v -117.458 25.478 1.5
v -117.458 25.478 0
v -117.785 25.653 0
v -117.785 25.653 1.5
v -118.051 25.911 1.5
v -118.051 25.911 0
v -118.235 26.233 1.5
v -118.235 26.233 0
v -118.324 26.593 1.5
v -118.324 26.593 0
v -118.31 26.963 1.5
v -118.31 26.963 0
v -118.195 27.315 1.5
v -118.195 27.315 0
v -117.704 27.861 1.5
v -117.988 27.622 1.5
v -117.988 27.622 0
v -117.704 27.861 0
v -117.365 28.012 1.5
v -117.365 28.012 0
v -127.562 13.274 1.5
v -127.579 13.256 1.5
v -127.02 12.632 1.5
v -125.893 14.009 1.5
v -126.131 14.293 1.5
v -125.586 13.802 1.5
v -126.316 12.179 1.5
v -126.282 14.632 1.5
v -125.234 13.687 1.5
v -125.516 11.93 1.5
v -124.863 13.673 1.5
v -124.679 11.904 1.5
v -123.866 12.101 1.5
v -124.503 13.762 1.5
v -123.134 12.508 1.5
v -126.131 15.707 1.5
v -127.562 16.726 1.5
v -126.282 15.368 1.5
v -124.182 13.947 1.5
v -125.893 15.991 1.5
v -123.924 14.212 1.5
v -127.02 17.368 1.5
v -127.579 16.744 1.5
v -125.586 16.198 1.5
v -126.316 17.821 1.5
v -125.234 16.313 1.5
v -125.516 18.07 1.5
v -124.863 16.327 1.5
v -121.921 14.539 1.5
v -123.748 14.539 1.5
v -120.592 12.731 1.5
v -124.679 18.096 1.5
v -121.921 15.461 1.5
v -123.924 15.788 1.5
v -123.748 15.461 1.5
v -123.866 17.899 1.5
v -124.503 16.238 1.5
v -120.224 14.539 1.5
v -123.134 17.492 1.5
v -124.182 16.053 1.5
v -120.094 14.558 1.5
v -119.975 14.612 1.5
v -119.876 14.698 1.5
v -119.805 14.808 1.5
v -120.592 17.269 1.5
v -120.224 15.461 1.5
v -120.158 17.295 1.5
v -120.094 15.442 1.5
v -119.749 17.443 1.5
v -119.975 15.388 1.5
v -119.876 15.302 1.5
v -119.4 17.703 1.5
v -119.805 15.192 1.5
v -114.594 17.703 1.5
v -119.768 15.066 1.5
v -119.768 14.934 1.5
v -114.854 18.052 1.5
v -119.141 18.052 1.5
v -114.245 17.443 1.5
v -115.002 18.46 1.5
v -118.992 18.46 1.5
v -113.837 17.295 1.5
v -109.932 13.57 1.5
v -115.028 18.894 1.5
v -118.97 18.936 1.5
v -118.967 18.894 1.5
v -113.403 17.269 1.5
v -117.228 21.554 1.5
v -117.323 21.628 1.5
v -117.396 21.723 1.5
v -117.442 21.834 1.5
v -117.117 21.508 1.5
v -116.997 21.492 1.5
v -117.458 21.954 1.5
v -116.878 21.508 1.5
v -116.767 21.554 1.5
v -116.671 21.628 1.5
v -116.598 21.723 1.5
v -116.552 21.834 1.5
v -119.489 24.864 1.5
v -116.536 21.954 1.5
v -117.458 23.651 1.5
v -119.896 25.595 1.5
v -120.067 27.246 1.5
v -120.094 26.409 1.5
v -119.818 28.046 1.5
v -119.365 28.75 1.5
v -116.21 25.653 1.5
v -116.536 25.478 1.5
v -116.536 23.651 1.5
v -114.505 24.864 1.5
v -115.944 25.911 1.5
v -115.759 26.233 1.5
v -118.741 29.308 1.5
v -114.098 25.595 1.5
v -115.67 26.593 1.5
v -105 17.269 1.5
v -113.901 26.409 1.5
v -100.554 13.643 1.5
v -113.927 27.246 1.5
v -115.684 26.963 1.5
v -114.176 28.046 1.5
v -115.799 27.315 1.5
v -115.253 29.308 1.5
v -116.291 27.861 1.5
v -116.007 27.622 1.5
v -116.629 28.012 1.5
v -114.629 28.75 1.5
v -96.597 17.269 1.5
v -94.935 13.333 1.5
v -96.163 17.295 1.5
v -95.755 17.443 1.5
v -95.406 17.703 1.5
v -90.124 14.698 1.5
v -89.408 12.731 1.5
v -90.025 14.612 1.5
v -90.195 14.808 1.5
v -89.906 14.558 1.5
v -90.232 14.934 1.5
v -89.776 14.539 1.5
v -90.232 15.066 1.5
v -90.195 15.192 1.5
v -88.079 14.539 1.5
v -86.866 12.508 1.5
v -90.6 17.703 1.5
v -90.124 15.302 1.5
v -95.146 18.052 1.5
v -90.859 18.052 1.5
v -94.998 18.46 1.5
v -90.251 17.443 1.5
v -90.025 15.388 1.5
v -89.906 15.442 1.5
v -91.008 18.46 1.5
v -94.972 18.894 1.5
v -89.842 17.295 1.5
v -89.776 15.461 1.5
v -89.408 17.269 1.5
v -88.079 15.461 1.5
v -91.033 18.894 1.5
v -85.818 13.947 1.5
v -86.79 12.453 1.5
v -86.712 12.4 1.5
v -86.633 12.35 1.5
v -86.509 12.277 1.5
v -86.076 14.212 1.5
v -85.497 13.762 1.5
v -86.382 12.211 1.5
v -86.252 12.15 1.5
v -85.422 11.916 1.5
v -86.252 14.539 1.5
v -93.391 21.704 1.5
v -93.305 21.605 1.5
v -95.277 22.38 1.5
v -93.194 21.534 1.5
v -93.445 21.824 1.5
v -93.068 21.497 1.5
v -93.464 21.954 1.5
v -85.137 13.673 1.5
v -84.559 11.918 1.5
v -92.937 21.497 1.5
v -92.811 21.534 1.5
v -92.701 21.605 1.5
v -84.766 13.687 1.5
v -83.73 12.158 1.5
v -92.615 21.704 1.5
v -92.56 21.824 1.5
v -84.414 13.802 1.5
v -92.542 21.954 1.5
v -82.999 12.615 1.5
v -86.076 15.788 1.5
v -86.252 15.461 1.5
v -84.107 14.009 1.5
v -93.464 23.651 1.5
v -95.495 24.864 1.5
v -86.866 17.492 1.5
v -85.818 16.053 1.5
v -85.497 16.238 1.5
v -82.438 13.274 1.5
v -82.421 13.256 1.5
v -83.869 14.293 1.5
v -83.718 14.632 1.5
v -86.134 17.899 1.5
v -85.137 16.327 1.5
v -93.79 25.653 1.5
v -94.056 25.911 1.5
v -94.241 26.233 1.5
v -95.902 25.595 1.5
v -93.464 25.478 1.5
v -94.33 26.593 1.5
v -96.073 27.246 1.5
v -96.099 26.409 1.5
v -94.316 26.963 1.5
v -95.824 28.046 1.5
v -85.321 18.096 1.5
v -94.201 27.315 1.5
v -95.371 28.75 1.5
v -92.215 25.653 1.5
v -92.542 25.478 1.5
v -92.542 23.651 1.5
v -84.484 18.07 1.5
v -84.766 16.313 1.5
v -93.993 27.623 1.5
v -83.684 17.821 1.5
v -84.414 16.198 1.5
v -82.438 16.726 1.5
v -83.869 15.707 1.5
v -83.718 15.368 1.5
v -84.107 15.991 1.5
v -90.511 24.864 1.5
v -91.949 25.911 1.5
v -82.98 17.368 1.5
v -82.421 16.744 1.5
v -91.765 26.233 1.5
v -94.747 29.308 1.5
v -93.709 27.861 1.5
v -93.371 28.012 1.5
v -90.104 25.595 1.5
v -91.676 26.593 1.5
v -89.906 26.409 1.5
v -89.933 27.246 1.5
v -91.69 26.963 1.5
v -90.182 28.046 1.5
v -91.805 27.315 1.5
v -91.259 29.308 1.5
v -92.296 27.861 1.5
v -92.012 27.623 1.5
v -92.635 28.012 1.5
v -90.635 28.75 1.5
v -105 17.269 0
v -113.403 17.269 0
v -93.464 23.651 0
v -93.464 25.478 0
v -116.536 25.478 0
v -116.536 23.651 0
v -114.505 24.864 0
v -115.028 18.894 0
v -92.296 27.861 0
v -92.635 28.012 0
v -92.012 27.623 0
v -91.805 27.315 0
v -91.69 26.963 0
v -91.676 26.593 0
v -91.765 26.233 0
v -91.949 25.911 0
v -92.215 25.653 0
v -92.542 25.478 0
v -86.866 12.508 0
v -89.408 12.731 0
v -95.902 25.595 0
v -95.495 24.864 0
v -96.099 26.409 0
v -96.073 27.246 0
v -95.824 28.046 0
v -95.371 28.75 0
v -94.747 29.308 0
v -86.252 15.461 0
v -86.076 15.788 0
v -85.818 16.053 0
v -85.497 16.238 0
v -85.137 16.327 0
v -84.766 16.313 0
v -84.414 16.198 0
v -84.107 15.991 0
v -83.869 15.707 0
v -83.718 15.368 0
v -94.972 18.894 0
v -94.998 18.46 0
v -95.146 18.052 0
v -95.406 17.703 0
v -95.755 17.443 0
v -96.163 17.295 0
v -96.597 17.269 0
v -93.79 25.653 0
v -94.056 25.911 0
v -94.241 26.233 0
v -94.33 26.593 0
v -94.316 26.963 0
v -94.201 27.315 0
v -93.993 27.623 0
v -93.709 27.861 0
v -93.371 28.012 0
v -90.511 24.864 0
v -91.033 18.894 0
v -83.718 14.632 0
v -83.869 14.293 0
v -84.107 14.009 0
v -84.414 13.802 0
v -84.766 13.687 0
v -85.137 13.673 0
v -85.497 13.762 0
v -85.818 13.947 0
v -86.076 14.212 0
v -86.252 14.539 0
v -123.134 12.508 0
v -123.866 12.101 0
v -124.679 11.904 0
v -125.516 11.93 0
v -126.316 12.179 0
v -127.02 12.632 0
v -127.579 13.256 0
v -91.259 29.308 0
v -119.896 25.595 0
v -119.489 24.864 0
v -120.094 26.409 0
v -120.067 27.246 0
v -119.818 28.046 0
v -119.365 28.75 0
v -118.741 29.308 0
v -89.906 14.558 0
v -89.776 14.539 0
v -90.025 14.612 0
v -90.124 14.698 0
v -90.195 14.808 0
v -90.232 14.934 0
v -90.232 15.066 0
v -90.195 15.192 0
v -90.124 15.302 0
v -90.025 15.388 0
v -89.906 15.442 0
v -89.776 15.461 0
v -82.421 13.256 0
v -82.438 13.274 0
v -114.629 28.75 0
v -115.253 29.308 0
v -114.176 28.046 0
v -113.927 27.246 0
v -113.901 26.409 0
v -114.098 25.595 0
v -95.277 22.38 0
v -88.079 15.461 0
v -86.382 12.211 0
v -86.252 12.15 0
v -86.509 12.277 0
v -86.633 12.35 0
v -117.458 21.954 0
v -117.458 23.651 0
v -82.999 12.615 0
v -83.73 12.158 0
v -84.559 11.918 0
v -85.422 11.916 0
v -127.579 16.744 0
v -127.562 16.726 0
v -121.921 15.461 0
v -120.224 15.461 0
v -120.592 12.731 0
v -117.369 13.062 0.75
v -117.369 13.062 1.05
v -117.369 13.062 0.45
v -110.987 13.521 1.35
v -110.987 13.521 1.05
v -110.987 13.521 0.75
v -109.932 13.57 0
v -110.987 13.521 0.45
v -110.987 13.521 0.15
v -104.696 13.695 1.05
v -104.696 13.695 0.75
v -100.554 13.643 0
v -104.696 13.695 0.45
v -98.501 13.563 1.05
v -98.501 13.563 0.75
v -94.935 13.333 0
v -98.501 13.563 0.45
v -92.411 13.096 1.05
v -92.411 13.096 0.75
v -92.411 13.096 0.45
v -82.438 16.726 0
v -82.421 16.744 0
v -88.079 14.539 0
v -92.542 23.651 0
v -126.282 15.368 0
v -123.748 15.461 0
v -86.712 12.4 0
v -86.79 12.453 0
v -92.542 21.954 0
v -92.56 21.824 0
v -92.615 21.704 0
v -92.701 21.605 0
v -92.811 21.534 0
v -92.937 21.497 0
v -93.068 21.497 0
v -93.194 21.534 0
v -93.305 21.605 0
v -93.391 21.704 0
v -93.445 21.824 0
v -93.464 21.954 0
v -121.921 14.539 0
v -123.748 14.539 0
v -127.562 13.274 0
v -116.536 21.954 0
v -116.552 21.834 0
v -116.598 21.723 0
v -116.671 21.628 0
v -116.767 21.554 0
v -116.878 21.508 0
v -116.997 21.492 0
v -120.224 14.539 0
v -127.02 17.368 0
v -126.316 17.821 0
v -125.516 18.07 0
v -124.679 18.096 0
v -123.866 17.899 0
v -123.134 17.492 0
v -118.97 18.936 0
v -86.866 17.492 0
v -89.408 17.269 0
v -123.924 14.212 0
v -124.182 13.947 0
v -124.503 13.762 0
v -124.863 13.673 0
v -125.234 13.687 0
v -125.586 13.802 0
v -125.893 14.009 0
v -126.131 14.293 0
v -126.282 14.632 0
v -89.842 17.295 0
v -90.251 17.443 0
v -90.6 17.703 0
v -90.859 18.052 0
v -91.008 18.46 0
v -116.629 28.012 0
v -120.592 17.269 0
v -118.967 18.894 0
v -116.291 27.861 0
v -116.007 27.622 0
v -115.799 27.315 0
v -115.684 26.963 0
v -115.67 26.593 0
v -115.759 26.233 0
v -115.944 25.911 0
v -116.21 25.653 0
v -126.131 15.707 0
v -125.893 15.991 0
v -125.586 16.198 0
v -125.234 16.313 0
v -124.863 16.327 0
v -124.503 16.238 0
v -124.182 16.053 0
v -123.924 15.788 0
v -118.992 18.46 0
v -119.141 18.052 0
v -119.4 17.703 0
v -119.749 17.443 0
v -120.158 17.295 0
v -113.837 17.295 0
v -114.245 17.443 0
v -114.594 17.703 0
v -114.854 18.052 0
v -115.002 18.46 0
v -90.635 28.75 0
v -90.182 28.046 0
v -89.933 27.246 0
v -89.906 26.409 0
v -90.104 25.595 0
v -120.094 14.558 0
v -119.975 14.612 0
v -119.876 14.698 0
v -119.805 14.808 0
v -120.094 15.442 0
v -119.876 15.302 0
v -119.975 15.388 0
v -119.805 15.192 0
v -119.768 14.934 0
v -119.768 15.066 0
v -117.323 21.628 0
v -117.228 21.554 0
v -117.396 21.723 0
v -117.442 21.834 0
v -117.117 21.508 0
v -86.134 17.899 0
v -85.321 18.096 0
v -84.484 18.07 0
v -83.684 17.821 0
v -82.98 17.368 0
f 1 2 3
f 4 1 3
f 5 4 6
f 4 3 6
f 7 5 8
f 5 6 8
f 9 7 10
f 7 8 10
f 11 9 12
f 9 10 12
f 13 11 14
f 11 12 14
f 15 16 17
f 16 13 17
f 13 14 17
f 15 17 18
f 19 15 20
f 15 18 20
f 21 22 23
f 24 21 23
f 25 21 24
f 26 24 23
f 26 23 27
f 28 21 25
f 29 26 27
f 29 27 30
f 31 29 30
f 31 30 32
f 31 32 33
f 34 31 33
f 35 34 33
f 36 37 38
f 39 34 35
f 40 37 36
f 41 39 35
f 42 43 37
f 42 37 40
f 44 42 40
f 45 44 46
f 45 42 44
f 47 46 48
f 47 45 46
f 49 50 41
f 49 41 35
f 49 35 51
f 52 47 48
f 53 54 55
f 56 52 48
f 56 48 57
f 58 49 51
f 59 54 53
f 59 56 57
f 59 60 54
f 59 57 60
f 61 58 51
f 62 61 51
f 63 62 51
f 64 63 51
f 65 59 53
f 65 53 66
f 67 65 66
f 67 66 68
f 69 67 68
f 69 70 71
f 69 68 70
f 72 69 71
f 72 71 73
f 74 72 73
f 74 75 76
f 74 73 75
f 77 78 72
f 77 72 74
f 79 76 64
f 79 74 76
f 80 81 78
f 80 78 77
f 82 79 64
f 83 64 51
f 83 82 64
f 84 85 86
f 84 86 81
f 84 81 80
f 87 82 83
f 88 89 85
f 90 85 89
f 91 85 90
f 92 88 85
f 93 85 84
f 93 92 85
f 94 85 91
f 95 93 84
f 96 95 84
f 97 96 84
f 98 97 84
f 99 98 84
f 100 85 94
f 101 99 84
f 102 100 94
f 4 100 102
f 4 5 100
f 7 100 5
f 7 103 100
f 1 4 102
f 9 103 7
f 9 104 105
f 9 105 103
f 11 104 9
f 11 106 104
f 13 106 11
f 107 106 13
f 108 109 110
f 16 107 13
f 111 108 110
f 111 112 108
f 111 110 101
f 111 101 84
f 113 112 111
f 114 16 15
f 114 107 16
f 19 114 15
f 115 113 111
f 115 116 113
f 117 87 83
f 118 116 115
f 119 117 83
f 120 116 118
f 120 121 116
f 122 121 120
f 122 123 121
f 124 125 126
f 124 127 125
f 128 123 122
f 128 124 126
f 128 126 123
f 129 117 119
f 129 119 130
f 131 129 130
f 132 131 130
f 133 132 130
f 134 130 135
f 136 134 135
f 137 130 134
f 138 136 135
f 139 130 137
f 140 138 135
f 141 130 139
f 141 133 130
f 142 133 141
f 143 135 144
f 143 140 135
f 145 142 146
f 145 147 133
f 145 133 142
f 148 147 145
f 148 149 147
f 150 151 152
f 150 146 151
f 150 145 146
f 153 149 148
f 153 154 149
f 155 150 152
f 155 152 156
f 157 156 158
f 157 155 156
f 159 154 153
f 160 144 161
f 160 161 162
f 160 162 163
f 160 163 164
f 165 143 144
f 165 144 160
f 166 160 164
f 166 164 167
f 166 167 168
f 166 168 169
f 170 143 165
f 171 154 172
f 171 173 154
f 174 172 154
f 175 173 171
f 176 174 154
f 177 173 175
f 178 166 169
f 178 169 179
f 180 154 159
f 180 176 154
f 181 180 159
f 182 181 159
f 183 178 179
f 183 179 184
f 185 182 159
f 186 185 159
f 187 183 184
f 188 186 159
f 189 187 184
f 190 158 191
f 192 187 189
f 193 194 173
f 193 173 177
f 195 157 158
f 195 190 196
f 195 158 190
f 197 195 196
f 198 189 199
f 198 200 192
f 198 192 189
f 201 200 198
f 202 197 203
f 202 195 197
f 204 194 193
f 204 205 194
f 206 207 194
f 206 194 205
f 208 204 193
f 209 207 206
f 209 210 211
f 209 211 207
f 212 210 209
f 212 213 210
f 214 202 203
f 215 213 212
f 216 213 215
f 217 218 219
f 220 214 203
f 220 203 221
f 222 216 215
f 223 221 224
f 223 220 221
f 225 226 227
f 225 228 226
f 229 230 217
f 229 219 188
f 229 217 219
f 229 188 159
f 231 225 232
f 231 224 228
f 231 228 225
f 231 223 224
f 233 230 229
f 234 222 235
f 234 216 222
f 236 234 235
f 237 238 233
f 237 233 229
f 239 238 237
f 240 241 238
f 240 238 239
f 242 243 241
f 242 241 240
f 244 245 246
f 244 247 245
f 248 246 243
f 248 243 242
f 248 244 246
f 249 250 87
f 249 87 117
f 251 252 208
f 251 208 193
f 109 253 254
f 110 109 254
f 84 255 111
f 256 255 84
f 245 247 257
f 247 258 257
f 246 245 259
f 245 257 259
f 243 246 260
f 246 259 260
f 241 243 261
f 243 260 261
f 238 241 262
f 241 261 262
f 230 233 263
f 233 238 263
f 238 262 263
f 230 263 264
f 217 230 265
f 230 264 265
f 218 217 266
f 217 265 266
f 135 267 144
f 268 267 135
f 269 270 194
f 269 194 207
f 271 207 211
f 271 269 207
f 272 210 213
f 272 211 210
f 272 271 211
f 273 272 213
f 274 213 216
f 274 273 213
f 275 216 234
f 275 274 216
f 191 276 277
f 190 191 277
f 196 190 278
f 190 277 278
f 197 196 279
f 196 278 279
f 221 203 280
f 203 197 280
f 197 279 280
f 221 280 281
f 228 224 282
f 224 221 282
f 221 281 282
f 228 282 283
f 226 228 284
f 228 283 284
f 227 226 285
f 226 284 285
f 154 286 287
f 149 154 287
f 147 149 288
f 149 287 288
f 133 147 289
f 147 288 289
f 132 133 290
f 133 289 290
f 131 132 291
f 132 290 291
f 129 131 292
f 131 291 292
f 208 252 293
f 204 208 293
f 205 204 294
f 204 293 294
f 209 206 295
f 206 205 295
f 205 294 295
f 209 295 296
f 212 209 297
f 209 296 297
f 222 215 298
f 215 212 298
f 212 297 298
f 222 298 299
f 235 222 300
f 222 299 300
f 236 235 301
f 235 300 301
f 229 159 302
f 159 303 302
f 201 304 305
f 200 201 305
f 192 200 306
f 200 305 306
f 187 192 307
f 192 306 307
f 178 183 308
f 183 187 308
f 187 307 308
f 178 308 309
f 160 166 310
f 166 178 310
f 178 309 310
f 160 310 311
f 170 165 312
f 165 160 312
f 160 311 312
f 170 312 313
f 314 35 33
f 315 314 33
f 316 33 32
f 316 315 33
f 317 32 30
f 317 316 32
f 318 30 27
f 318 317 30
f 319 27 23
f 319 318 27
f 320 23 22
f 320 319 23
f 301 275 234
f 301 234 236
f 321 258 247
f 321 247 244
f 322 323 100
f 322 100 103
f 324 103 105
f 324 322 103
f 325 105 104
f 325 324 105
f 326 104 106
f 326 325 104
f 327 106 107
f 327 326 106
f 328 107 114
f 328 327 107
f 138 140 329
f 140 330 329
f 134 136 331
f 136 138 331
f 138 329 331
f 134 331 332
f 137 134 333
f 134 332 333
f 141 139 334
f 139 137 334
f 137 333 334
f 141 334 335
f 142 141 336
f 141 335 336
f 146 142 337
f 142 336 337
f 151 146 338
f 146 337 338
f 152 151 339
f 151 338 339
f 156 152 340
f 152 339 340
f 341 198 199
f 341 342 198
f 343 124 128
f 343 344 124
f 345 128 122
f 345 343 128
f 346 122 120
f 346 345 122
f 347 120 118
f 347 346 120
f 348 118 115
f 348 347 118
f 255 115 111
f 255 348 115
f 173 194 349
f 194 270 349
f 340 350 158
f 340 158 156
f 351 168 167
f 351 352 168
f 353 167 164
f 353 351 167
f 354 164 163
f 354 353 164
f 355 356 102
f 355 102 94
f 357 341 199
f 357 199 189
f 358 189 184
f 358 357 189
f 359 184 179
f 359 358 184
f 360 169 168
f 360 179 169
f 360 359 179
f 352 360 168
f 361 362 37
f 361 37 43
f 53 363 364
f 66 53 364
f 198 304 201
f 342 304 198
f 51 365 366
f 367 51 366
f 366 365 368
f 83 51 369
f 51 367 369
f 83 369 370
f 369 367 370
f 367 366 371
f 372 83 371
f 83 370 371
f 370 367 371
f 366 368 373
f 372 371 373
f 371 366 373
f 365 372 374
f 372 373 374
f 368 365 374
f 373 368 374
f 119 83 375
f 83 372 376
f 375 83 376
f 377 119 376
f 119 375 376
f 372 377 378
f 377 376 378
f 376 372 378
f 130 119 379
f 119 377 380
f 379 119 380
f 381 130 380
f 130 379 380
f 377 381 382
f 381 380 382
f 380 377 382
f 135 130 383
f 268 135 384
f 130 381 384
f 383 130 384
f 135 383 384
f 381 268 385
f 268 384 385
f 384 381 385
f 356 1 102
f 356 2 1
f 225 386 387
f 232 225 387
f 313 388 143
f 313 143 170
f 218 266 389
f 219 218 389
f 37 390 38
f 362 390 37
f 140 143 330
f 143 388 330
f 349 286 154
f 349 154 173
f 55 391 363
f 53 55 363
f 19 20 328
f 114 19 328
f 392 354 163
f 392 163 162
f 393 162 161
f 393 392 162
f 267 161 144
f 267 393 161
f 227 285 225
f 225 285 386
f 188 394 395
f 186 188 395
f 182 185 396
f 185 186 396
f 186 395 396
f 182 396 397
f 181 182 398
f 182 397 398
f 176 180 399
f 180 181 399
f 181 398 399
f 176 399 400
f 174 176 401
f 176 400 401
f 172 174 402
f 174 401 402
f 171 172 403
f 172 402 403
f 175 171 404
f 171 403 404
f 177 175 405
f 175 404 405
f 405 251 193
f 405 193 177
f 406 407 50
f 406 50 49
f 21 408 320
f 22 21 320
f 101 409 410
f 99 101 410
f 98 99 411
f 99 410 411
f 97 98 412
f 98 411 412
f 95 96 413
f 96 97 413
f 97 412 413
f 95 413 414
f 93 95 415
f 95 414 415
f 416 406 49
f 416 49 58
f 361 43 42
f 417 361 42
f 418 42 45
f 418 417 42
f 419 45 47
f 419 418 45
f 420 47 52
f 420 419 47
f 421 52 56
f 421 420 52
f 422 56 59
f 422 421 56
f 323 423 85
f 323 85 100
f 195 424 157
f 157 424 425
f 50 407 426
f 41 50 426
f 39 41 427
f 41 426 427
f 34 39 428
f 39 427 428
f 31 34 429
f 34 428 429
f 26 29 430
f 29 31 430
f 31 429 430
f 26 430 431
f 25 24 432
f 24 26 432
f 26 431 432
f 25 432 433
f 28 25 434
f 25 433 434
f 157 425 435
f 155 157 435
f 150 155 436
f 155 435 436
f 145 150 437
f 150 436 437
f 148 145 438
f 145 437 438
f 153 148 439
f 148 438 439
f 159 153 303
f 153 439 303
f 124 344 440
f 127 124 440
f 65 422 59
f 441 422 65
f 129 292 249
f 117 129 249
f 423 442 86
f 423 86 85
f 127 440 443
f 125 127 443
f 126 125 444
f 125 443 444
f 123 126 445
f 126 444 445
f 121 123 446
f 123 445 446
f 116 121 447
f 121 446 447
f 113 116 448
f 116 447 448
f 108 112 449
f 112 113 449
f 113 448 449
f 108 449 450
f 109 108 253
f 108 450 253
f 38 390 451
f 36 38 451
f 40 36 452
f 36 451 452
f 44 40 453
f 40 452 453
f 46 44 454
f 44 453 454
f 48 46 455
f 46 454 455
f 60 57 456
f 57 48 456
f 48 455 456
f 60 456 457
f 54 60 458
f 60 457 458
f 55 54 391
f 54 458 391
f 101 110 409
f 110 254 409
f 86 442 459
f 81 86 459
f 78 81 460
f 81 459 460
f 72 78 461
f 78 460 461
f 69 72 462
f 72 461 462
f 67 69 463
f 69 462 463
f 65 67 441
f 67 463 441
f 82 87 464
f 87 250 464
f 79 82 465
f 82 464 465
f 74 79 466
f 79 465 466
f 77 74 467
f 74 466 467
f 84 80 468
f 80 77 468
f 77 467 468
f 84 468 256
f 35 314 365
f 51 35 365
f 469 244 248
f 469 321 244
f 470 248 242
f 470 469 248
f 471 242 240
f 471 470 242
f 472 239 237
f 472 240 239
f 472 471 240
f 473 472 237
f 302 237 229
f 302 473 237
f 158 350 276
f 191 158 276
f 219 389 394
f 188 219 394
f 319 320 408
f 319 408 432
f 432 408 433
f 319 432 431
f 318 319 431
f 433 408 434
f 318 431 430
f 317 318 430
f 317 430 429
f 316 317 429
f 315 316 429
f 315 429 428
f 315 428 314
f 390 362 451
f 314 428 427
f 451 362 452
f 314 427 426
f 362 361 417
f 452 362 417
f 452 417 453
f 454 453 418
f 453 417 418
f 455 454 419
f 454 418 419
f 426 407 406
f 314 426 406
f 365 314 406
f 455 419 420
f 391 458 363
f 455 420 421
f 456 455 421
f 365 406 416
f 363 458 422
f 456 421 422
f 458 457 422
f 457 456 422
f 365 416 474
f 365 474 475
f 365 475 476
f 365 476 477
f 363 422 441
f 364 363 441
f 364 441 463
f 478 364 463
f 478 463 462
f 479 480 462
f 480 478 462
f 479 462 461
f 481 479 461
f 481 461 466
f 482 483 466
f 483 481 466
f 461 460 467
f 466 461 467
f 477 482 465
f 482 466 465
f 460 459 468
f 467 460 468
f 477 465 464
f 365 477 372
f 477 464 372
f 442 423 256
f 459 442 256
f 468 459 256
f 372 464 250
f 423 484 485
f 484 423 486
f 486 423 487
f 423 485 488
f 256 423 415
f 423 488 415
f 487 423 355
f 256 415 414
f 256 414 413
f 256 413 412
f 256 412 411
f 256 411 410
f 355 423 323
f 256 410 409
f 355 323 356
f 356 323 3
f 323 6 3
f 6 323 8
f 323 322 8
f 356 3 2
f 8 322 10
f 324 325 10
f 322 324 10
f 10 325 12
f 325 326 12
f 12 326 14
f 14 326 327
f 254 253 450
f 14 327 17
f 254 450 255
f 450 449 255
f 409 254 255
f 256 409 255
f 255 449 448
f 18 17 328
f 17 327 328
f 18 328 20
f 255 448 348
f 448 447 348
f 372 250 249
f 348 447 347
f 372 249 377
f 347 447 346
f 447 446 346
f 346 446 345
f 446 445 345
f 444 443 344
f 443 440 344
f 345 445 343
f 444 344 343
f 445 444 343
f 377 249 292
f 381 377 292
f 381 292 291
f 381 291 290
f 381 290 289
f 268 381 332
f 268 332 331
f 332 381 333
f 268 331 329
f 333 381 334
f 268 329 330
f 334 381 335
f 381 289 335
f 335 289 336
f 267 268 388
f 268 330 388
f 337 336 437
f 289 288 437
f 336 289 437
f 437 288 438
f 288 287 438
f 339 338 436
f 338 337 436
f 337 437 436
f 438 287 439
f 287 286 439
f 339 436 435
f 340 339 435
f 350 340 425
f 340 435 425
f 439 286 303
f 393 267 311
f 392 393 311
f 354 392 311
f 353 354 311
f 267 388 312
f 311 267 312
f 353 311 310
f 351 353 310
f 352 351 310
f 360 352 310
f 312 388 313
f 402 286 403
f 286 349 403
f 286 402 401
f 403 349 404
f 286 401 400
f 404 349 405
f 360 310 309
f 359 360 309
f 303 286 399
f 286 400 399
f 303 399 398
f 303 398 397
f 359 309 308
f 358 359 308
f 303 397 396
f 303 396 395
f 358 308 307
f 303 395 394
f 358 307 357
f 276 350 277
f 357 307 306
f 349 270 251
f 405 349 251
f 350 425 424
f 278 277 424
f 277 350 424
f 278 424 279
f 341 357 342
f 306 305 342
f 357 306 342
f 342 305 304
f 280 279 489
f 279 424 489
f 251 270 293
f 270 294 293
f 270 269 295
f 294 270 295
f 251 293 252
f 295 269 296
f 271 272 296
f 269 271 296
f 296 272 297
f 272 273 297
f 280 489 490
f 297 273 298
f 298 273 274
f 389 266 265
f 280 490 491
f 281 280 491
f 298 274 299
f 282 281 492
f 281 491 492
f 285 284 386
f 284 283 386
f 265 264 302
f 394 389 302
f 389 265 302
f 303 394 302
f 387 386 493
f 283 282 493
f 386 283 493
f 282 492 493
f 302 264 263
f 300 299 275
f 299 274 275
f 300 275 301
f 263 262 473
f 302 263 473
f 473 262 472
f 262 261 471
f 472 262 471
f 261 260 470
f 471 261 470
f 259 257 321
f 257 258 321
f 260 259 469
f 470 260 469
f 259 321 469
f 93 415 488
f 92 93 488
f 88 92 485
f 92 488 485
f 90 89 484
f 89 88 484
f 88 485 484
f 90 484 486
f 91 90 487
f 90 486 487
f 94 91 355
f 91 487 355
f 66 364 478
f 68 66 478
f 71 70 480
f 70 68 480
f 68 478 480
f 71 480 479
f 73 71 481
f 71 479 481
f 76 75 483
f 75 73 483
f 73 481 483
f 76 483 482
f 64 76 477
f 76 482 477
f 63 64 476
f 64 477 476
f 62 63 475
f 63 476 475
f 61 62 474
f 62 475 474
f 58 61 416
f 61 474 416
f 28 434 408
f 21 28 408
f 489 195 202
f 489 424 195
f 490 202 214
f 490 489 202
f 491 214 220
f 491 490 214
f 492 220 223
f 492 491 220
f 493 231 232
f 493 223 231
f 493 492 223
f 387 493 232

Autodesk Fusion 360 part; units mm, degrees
sketch "top view" plane through (0, 0, 0) normal (0, 0, 1) x (1, 0, 0)
  line L0 (-105, 33) -> (-105, -11) construction
  line L1 (-125, 15) -> (-126.282, 15) construction
  line L2 (-126.282, 15) -> (-126.282, 15.368) construction
  line L3 (-126.282, 15.368) -> (-127.5617, 16.726)
  line L4 (-126.282, 15.368) -> (-124.416, 15.368) construction
  line L5 (-127.5617, 16.726) -> (-127.5786, 16.744)
  line L6 (-126.282, 14.632) -> (-127.5617, 13.274)
  line L7 (-127.5617, 13.274) -> (-127.5786, 13.256)
  line L8 (-125, 15) -> (-123.748, 15) construction
  line L9 (-123.748, 15) -> (-123.748, 17.8501) construction
  line L10 (-123.748, 15) -> (-123.748, 12.1499) construction
  line L11 (-123.748, 15) -> (-123.748, 15.461) construction
  line L12 (-123.748, 15) -> (-123.748, 14.539) construction
  arc A0 (-126.282, 14.632) -> (-123.7484, 14.539) centre (-125, 15) ccw
  arc A1 (-123.7484, 15.461) -> (-126.282, 15.368) centre (-125, 15) ccw
  line L13 (-121.9213, 15.461) -> (-120.224, 15.461)
  line L14 (-121.9213, 14.539) -> (-120.224, 14.539)
  arc A2 (-127.5786, 13.256) -> (-123.134, 12.5083) centre (-125, 15) ccw
  arc A3 (-123.134, 17.4917) -> (-127.5786, 16.744) centre (-125, 15) ccw
  arc A4 (-120.224, 14.539) -> (-120.224, 15.461) centre (-120.224, 15) ccw
  line L15 (-125, 15) -> (-123.134, 15) construction
  line L16 (-123.134, 15) -> (-123.134, 17.4917) construction
  line L17 (-123.134, 17.4917) -> (-120.5917, 17.2693)
  line L18 (-123.134, 17.4917) -> (-120.582, 17.4917) construction
  line L19 (-123.134, 12.5083) -> (-120.5917, 12.7307)
  line L20 (-118.9667, 18.8943) -> (-119.4889, 24.8635)
  line L21 (-118.9667, 18.8943) -> (-111.0132, 18.8943) construction
  line L22 (-123.134, 17.4917) -> (-118.737, 17.4917) construction
  line L23 (-118.9667, 18.8942) -> (-118.9667, 18.8942)
  arc A5 (-120.5917, 17.2693) -> (-118.9667, 18.8943) centre (-120.461, 18.7636) ccw
  line L24 (-119.4004, 17.7029) -> (-121.3897, 15.7137) construction
  line L25 (-119.4004, 17.7029) -> (-116.4958, 14.7981) construction
  line L26 (-123.748, 15.461) -> (-121.9213, 15.461)
  line L27 (-123.748, 14.539) -> (-121.9213, 14.539)
  arc A6 (-117.4582, 21.9535) -> (-116.9972, 21.4925) centre (-116.9972, 21.9535) ccw
  line L28 (-116.9972, 20.106) -> (-116.9972, 11.6268) construction
  arc A7 (-115.0277, 18.8943) -> (-113.4026, 17.2693) centre (-113.5334, 18.7636) ccw
  line L29 (-113.4026, 17.2693) -> (-105, 17.2693)
  line L30 (-105, 33) -> (-105, -11) construction
  line L31 (-96.5974, 17.2693) -> (-105, 17.2693)
  arc A8 (-96.5974, 17.2693) -> (-94.9723, 18.8943) centre (-96.4667, 18.7636) ccw
  line L32 (-94.9723, 18.8943) -> (-95.2773, 22.3803)
  line L33 (-93.0028, 20.106) -> (-93.0028, 11.6268) construction
  line L34 (-91.7911, 18.8943) -> (-98.9868, 18.8943) construction
  line L35 (-91.0333, 17.2692) -> (-93.5042, 14.7981) construction
  line L36 (-91.0333, 17.4917) -> (-91.263, 17.4917) construction
  line L37 (-82.4383, 16.726) -> (-82.4214, 16.744)
  line L38 (-83.718, 15) -> (-83.718, 15.368) construction
  arc A9 (-86.866, 12.5083) -> (-86.252, 12.1499) centre (-85, 15) ccw
  line L39 (-91.0333, 18.8943) -> (-91.0333, 18.8943)
  line L40 (-82.4383, 13.274) -> (-82.4214, 13.256)
  spline S0 degree 5 poles (-120.5917, 12.7307) (-119.326, 12.8736) (-116.8026, 13.1337) (-113.042, 13.4467) (-108.0773, 13.7071) (-101.9596, 13.7532) (-97.0107, 13.5402) (-93.3168, 13.2188) (-90.8349, 12.9243) (-89.5363, 12.7482) (-89.4083, 12.7307) knots 0 0 0 0 0 0 0.1 0.2 0.3 0.4 0.5 0.51094 0.51094 0.51094 0.51094 0.51094 0.51094
  line L41 (-92.4447, 13.1474) -> (-86.3719, 12.3139)
  line L42 (-123.748, 14.539) -> (-123.7484, 14.539)
  line L43 (-123.748, 15.461) -> (-123.7484, 15.461)
  line L44 (-116.5362, 25.4775) -> (-116.5362, 25.4779)
  line L45 (-117.4582, 25.4775) -> (-117.4582, 25.4779)
  line L46 (-115.0277, 18.8943) -> (-115.0278, 18.8929)
  line L47 (-118.9704, 18.9365) -> (-118.9667, 18.8943)
  line L48 (-119.4004, 17.7029) -> (-116.9972, 20.106) construction
  line L49 (-125, 15) -> (-93.0028, 15) construction
  line L50 (-93.0028, 15) -> (-125, 15) construction
  line L51 (-91.7911, 18.8943) -> (-93.0028, 20.106) construction
  arc A10 (-114.5054, 24.8635) -> (-115.2532, 29.3081) centre (-116.9972, 26.7295) ccw
  arc A11 (-118.7411, 29.3081) -> (-119.4889, 24.8635) centre (-116.9972, 26.7295) ccw
  arc A12 (-117.3652, 28.0115) -> (-117.4582, 25.4779) centre (-116.9972, 26.7295) ccw
  arc A13 (-116.5362, 25.4779) -> (-116.6292, 28.0115) centre (-116.9972, 26.7295) ccw
  line L52 (-116.5362, 23.6508) -> (-116.5362, 21.9535)
  arc A14 (-117.4582, 21.9535) -> (-116.5362, 21.9535) centre (-116.9972, 21.9535) ccw
  line L53 (-117.4582, 23.6508) -> (-117.4582, 21.9535)
  line L54 (-116.5362, 25.4779) -> (-116.5362, 23.6508)
  line L55 (-117.4582, 25.4779) -> (-117.4582, 23.6508)
  line L56 (-115.2532, 29.3081) -> (-116.6292, 28.0115)
  line L57 (-117.3652, 28.0115) -> (-118.7411, 29.3081)
  line L58 (-114.5054, 24.8635) -> (-115.0278, 18.8929)
  arc A15 (-90.5111, 24.8635) -> (-91.2589, 29.3081) centre (-93.0028, 26.7295) ccw
  arc A16 (-94.7468, 29.3081) -> (-95.4946, 24.8635) centre (-93.0028, 26.7295) ccw
  line L59 (-94.7468, 29.3081) -> (-93.3708, 28.0115)
  line L60 (-92.6348, 28.0115) -> (-91.2589, 29.3081)
  arc A17 (-92.5418, 25.4779) -> (-92.6348, 28.0115) centre (-93.0028, 26.7295) ccw
  arc A18 (-93.3708, 28.0115) -> (-93.4638, 25.4779) centre (-93.0028, 26.7295) ccw
  line L61 (-93.4638, 25.4779) -> (-93.4638, 23.6508)
  line L62 (-92.5418, 25.4779) -> (-92.5418, 23.6508)
  line L63 (-91.0333, 18.8943) -> (-90.5111, 24.8635)
  line L64 (-92.5418, 23.6508) -> (-92.5418, 21.9535)
  line L65 (-93.4638, 23.6508) -> (-93.4638, 21.9535)
  arc A19 (-93.4638, 21.9535) -> (-92.5418, 21.9535) centre (-93.0028, 21.9535) ccw
  arc A20 (-91.0333, 18.8943) -> (-89.4083, 17.2693) centre (-89.539, 18.7636) ccw
  line L66 (-86.866, 17.4917) -> (-89.4083, 17.2693)
  arc A21 (-82.4214, 16.744) -> (-86.866, 17.4917) centre (-85, 15) ccw
  arc A22 (-83.718, 15.368) -> (-86.2516, 15.461) centre (-85, 15) ccw
  arc A23 (-86.2516, 14.539) -> (-83.718, 14.632) centre (-85, 15) ccw
  arc A24 (-86.866, 12.5083) -> (-82.4214, 13.256) centre (-85, 15) ccw
  line L67 (-88.0787, 14.539) -> (-89.776, 14.539)
  line L68 (-88.0787, 15.461) -> (-89.776, 15.461)
  arc A25 (-89.776, 15.461) -> (-89.776, 14.539) centre (-89.776, 15) ccw
  line L69 (-95.4946, 24.8635) -> (-94.9722, 18.8929)
  line L70 (-86.866, 12.5083) -> (-89.4083, 12.7307)
  line L71 (-88.0787, 15.461) -> (-86.2516, 15.461)
  line L72 (-88.0787, 14.539) -> (-86.2516, 14.539)
  line L73 (-83.718, 15.368) -> (-82.4214, 16.744)
  line L74 (-83.718, 14.632) -> (-82.4214, 13.256)
  point P0 (-95.4946, 24.8635)
  point P1 (-94.7468, 29.3081)
  point P2 (-93.0028, 26.7295)
  point P3 (-88.6103, 15.7137)
  dimension "d3" = 6.226
  dimension "d4" = 1.282
  dimension "d5" = 0.368
  dimension "d6" = 133.3
  dimension "d7" = 1.866
  dimension "d8" = 1.252
  dimension "d9" = 0.461
  dimension "d10" = 0.461
  dimension "d11" = 3.524
  dimension "d12" = 0.922
  dimension "d13" = 1.866
  dimension "d14" = 2.552
  dimension "d15" = 5
  dimension "d16" = 3
  dimension "d17" = 95
  dimension "d18" = 5.992
  dimension "d20" = 4.397
  dimension "d24" = 0.922
  dimension "d25" = 6.226
  dimension "d28" = 0.922
extrude "Extrude1" add sketch "top view" along normal blind 1.5 contours L3 L5 L6 L7 A0 A1 L13 L14 A2 A3 A4 L17 L19 L20 A5 L26 L27 A6 A7 L29 L31 A8 L32 L37 A9 L40 S0 L47 A10 A11 A12 A13 L52 A14 L53 L54 L55 L56 L57 L58 A15 A16 L59 L60 A17 A18 L61 L62 L63 L64 L65 A19 A20 L66 A21 A22 A23 A24 L67 L68 A25 L69 L70 L71 L72 L73 L74 makes body 1
copy_body "Body->Comp1" bodies 1 removing the originals makes body 2 in component "Piesa_5 (1)"
component "Piesa_5 (1)" placed x (1, 0, 0) y (0, 1, 0) z (0, 0, 1) at (0, 0, 0)
equation "d3 = 3.113 mm + 3.113 mm"
equation "d12 = 0.461 mm + 0.461 mm"
equation "d24 = 0.461 mm + 0.461 mm"
equation "d25 = 3.113 mm + 3.113 mm"
equation "d28 = 0.461 mm + 0.461 mm"
